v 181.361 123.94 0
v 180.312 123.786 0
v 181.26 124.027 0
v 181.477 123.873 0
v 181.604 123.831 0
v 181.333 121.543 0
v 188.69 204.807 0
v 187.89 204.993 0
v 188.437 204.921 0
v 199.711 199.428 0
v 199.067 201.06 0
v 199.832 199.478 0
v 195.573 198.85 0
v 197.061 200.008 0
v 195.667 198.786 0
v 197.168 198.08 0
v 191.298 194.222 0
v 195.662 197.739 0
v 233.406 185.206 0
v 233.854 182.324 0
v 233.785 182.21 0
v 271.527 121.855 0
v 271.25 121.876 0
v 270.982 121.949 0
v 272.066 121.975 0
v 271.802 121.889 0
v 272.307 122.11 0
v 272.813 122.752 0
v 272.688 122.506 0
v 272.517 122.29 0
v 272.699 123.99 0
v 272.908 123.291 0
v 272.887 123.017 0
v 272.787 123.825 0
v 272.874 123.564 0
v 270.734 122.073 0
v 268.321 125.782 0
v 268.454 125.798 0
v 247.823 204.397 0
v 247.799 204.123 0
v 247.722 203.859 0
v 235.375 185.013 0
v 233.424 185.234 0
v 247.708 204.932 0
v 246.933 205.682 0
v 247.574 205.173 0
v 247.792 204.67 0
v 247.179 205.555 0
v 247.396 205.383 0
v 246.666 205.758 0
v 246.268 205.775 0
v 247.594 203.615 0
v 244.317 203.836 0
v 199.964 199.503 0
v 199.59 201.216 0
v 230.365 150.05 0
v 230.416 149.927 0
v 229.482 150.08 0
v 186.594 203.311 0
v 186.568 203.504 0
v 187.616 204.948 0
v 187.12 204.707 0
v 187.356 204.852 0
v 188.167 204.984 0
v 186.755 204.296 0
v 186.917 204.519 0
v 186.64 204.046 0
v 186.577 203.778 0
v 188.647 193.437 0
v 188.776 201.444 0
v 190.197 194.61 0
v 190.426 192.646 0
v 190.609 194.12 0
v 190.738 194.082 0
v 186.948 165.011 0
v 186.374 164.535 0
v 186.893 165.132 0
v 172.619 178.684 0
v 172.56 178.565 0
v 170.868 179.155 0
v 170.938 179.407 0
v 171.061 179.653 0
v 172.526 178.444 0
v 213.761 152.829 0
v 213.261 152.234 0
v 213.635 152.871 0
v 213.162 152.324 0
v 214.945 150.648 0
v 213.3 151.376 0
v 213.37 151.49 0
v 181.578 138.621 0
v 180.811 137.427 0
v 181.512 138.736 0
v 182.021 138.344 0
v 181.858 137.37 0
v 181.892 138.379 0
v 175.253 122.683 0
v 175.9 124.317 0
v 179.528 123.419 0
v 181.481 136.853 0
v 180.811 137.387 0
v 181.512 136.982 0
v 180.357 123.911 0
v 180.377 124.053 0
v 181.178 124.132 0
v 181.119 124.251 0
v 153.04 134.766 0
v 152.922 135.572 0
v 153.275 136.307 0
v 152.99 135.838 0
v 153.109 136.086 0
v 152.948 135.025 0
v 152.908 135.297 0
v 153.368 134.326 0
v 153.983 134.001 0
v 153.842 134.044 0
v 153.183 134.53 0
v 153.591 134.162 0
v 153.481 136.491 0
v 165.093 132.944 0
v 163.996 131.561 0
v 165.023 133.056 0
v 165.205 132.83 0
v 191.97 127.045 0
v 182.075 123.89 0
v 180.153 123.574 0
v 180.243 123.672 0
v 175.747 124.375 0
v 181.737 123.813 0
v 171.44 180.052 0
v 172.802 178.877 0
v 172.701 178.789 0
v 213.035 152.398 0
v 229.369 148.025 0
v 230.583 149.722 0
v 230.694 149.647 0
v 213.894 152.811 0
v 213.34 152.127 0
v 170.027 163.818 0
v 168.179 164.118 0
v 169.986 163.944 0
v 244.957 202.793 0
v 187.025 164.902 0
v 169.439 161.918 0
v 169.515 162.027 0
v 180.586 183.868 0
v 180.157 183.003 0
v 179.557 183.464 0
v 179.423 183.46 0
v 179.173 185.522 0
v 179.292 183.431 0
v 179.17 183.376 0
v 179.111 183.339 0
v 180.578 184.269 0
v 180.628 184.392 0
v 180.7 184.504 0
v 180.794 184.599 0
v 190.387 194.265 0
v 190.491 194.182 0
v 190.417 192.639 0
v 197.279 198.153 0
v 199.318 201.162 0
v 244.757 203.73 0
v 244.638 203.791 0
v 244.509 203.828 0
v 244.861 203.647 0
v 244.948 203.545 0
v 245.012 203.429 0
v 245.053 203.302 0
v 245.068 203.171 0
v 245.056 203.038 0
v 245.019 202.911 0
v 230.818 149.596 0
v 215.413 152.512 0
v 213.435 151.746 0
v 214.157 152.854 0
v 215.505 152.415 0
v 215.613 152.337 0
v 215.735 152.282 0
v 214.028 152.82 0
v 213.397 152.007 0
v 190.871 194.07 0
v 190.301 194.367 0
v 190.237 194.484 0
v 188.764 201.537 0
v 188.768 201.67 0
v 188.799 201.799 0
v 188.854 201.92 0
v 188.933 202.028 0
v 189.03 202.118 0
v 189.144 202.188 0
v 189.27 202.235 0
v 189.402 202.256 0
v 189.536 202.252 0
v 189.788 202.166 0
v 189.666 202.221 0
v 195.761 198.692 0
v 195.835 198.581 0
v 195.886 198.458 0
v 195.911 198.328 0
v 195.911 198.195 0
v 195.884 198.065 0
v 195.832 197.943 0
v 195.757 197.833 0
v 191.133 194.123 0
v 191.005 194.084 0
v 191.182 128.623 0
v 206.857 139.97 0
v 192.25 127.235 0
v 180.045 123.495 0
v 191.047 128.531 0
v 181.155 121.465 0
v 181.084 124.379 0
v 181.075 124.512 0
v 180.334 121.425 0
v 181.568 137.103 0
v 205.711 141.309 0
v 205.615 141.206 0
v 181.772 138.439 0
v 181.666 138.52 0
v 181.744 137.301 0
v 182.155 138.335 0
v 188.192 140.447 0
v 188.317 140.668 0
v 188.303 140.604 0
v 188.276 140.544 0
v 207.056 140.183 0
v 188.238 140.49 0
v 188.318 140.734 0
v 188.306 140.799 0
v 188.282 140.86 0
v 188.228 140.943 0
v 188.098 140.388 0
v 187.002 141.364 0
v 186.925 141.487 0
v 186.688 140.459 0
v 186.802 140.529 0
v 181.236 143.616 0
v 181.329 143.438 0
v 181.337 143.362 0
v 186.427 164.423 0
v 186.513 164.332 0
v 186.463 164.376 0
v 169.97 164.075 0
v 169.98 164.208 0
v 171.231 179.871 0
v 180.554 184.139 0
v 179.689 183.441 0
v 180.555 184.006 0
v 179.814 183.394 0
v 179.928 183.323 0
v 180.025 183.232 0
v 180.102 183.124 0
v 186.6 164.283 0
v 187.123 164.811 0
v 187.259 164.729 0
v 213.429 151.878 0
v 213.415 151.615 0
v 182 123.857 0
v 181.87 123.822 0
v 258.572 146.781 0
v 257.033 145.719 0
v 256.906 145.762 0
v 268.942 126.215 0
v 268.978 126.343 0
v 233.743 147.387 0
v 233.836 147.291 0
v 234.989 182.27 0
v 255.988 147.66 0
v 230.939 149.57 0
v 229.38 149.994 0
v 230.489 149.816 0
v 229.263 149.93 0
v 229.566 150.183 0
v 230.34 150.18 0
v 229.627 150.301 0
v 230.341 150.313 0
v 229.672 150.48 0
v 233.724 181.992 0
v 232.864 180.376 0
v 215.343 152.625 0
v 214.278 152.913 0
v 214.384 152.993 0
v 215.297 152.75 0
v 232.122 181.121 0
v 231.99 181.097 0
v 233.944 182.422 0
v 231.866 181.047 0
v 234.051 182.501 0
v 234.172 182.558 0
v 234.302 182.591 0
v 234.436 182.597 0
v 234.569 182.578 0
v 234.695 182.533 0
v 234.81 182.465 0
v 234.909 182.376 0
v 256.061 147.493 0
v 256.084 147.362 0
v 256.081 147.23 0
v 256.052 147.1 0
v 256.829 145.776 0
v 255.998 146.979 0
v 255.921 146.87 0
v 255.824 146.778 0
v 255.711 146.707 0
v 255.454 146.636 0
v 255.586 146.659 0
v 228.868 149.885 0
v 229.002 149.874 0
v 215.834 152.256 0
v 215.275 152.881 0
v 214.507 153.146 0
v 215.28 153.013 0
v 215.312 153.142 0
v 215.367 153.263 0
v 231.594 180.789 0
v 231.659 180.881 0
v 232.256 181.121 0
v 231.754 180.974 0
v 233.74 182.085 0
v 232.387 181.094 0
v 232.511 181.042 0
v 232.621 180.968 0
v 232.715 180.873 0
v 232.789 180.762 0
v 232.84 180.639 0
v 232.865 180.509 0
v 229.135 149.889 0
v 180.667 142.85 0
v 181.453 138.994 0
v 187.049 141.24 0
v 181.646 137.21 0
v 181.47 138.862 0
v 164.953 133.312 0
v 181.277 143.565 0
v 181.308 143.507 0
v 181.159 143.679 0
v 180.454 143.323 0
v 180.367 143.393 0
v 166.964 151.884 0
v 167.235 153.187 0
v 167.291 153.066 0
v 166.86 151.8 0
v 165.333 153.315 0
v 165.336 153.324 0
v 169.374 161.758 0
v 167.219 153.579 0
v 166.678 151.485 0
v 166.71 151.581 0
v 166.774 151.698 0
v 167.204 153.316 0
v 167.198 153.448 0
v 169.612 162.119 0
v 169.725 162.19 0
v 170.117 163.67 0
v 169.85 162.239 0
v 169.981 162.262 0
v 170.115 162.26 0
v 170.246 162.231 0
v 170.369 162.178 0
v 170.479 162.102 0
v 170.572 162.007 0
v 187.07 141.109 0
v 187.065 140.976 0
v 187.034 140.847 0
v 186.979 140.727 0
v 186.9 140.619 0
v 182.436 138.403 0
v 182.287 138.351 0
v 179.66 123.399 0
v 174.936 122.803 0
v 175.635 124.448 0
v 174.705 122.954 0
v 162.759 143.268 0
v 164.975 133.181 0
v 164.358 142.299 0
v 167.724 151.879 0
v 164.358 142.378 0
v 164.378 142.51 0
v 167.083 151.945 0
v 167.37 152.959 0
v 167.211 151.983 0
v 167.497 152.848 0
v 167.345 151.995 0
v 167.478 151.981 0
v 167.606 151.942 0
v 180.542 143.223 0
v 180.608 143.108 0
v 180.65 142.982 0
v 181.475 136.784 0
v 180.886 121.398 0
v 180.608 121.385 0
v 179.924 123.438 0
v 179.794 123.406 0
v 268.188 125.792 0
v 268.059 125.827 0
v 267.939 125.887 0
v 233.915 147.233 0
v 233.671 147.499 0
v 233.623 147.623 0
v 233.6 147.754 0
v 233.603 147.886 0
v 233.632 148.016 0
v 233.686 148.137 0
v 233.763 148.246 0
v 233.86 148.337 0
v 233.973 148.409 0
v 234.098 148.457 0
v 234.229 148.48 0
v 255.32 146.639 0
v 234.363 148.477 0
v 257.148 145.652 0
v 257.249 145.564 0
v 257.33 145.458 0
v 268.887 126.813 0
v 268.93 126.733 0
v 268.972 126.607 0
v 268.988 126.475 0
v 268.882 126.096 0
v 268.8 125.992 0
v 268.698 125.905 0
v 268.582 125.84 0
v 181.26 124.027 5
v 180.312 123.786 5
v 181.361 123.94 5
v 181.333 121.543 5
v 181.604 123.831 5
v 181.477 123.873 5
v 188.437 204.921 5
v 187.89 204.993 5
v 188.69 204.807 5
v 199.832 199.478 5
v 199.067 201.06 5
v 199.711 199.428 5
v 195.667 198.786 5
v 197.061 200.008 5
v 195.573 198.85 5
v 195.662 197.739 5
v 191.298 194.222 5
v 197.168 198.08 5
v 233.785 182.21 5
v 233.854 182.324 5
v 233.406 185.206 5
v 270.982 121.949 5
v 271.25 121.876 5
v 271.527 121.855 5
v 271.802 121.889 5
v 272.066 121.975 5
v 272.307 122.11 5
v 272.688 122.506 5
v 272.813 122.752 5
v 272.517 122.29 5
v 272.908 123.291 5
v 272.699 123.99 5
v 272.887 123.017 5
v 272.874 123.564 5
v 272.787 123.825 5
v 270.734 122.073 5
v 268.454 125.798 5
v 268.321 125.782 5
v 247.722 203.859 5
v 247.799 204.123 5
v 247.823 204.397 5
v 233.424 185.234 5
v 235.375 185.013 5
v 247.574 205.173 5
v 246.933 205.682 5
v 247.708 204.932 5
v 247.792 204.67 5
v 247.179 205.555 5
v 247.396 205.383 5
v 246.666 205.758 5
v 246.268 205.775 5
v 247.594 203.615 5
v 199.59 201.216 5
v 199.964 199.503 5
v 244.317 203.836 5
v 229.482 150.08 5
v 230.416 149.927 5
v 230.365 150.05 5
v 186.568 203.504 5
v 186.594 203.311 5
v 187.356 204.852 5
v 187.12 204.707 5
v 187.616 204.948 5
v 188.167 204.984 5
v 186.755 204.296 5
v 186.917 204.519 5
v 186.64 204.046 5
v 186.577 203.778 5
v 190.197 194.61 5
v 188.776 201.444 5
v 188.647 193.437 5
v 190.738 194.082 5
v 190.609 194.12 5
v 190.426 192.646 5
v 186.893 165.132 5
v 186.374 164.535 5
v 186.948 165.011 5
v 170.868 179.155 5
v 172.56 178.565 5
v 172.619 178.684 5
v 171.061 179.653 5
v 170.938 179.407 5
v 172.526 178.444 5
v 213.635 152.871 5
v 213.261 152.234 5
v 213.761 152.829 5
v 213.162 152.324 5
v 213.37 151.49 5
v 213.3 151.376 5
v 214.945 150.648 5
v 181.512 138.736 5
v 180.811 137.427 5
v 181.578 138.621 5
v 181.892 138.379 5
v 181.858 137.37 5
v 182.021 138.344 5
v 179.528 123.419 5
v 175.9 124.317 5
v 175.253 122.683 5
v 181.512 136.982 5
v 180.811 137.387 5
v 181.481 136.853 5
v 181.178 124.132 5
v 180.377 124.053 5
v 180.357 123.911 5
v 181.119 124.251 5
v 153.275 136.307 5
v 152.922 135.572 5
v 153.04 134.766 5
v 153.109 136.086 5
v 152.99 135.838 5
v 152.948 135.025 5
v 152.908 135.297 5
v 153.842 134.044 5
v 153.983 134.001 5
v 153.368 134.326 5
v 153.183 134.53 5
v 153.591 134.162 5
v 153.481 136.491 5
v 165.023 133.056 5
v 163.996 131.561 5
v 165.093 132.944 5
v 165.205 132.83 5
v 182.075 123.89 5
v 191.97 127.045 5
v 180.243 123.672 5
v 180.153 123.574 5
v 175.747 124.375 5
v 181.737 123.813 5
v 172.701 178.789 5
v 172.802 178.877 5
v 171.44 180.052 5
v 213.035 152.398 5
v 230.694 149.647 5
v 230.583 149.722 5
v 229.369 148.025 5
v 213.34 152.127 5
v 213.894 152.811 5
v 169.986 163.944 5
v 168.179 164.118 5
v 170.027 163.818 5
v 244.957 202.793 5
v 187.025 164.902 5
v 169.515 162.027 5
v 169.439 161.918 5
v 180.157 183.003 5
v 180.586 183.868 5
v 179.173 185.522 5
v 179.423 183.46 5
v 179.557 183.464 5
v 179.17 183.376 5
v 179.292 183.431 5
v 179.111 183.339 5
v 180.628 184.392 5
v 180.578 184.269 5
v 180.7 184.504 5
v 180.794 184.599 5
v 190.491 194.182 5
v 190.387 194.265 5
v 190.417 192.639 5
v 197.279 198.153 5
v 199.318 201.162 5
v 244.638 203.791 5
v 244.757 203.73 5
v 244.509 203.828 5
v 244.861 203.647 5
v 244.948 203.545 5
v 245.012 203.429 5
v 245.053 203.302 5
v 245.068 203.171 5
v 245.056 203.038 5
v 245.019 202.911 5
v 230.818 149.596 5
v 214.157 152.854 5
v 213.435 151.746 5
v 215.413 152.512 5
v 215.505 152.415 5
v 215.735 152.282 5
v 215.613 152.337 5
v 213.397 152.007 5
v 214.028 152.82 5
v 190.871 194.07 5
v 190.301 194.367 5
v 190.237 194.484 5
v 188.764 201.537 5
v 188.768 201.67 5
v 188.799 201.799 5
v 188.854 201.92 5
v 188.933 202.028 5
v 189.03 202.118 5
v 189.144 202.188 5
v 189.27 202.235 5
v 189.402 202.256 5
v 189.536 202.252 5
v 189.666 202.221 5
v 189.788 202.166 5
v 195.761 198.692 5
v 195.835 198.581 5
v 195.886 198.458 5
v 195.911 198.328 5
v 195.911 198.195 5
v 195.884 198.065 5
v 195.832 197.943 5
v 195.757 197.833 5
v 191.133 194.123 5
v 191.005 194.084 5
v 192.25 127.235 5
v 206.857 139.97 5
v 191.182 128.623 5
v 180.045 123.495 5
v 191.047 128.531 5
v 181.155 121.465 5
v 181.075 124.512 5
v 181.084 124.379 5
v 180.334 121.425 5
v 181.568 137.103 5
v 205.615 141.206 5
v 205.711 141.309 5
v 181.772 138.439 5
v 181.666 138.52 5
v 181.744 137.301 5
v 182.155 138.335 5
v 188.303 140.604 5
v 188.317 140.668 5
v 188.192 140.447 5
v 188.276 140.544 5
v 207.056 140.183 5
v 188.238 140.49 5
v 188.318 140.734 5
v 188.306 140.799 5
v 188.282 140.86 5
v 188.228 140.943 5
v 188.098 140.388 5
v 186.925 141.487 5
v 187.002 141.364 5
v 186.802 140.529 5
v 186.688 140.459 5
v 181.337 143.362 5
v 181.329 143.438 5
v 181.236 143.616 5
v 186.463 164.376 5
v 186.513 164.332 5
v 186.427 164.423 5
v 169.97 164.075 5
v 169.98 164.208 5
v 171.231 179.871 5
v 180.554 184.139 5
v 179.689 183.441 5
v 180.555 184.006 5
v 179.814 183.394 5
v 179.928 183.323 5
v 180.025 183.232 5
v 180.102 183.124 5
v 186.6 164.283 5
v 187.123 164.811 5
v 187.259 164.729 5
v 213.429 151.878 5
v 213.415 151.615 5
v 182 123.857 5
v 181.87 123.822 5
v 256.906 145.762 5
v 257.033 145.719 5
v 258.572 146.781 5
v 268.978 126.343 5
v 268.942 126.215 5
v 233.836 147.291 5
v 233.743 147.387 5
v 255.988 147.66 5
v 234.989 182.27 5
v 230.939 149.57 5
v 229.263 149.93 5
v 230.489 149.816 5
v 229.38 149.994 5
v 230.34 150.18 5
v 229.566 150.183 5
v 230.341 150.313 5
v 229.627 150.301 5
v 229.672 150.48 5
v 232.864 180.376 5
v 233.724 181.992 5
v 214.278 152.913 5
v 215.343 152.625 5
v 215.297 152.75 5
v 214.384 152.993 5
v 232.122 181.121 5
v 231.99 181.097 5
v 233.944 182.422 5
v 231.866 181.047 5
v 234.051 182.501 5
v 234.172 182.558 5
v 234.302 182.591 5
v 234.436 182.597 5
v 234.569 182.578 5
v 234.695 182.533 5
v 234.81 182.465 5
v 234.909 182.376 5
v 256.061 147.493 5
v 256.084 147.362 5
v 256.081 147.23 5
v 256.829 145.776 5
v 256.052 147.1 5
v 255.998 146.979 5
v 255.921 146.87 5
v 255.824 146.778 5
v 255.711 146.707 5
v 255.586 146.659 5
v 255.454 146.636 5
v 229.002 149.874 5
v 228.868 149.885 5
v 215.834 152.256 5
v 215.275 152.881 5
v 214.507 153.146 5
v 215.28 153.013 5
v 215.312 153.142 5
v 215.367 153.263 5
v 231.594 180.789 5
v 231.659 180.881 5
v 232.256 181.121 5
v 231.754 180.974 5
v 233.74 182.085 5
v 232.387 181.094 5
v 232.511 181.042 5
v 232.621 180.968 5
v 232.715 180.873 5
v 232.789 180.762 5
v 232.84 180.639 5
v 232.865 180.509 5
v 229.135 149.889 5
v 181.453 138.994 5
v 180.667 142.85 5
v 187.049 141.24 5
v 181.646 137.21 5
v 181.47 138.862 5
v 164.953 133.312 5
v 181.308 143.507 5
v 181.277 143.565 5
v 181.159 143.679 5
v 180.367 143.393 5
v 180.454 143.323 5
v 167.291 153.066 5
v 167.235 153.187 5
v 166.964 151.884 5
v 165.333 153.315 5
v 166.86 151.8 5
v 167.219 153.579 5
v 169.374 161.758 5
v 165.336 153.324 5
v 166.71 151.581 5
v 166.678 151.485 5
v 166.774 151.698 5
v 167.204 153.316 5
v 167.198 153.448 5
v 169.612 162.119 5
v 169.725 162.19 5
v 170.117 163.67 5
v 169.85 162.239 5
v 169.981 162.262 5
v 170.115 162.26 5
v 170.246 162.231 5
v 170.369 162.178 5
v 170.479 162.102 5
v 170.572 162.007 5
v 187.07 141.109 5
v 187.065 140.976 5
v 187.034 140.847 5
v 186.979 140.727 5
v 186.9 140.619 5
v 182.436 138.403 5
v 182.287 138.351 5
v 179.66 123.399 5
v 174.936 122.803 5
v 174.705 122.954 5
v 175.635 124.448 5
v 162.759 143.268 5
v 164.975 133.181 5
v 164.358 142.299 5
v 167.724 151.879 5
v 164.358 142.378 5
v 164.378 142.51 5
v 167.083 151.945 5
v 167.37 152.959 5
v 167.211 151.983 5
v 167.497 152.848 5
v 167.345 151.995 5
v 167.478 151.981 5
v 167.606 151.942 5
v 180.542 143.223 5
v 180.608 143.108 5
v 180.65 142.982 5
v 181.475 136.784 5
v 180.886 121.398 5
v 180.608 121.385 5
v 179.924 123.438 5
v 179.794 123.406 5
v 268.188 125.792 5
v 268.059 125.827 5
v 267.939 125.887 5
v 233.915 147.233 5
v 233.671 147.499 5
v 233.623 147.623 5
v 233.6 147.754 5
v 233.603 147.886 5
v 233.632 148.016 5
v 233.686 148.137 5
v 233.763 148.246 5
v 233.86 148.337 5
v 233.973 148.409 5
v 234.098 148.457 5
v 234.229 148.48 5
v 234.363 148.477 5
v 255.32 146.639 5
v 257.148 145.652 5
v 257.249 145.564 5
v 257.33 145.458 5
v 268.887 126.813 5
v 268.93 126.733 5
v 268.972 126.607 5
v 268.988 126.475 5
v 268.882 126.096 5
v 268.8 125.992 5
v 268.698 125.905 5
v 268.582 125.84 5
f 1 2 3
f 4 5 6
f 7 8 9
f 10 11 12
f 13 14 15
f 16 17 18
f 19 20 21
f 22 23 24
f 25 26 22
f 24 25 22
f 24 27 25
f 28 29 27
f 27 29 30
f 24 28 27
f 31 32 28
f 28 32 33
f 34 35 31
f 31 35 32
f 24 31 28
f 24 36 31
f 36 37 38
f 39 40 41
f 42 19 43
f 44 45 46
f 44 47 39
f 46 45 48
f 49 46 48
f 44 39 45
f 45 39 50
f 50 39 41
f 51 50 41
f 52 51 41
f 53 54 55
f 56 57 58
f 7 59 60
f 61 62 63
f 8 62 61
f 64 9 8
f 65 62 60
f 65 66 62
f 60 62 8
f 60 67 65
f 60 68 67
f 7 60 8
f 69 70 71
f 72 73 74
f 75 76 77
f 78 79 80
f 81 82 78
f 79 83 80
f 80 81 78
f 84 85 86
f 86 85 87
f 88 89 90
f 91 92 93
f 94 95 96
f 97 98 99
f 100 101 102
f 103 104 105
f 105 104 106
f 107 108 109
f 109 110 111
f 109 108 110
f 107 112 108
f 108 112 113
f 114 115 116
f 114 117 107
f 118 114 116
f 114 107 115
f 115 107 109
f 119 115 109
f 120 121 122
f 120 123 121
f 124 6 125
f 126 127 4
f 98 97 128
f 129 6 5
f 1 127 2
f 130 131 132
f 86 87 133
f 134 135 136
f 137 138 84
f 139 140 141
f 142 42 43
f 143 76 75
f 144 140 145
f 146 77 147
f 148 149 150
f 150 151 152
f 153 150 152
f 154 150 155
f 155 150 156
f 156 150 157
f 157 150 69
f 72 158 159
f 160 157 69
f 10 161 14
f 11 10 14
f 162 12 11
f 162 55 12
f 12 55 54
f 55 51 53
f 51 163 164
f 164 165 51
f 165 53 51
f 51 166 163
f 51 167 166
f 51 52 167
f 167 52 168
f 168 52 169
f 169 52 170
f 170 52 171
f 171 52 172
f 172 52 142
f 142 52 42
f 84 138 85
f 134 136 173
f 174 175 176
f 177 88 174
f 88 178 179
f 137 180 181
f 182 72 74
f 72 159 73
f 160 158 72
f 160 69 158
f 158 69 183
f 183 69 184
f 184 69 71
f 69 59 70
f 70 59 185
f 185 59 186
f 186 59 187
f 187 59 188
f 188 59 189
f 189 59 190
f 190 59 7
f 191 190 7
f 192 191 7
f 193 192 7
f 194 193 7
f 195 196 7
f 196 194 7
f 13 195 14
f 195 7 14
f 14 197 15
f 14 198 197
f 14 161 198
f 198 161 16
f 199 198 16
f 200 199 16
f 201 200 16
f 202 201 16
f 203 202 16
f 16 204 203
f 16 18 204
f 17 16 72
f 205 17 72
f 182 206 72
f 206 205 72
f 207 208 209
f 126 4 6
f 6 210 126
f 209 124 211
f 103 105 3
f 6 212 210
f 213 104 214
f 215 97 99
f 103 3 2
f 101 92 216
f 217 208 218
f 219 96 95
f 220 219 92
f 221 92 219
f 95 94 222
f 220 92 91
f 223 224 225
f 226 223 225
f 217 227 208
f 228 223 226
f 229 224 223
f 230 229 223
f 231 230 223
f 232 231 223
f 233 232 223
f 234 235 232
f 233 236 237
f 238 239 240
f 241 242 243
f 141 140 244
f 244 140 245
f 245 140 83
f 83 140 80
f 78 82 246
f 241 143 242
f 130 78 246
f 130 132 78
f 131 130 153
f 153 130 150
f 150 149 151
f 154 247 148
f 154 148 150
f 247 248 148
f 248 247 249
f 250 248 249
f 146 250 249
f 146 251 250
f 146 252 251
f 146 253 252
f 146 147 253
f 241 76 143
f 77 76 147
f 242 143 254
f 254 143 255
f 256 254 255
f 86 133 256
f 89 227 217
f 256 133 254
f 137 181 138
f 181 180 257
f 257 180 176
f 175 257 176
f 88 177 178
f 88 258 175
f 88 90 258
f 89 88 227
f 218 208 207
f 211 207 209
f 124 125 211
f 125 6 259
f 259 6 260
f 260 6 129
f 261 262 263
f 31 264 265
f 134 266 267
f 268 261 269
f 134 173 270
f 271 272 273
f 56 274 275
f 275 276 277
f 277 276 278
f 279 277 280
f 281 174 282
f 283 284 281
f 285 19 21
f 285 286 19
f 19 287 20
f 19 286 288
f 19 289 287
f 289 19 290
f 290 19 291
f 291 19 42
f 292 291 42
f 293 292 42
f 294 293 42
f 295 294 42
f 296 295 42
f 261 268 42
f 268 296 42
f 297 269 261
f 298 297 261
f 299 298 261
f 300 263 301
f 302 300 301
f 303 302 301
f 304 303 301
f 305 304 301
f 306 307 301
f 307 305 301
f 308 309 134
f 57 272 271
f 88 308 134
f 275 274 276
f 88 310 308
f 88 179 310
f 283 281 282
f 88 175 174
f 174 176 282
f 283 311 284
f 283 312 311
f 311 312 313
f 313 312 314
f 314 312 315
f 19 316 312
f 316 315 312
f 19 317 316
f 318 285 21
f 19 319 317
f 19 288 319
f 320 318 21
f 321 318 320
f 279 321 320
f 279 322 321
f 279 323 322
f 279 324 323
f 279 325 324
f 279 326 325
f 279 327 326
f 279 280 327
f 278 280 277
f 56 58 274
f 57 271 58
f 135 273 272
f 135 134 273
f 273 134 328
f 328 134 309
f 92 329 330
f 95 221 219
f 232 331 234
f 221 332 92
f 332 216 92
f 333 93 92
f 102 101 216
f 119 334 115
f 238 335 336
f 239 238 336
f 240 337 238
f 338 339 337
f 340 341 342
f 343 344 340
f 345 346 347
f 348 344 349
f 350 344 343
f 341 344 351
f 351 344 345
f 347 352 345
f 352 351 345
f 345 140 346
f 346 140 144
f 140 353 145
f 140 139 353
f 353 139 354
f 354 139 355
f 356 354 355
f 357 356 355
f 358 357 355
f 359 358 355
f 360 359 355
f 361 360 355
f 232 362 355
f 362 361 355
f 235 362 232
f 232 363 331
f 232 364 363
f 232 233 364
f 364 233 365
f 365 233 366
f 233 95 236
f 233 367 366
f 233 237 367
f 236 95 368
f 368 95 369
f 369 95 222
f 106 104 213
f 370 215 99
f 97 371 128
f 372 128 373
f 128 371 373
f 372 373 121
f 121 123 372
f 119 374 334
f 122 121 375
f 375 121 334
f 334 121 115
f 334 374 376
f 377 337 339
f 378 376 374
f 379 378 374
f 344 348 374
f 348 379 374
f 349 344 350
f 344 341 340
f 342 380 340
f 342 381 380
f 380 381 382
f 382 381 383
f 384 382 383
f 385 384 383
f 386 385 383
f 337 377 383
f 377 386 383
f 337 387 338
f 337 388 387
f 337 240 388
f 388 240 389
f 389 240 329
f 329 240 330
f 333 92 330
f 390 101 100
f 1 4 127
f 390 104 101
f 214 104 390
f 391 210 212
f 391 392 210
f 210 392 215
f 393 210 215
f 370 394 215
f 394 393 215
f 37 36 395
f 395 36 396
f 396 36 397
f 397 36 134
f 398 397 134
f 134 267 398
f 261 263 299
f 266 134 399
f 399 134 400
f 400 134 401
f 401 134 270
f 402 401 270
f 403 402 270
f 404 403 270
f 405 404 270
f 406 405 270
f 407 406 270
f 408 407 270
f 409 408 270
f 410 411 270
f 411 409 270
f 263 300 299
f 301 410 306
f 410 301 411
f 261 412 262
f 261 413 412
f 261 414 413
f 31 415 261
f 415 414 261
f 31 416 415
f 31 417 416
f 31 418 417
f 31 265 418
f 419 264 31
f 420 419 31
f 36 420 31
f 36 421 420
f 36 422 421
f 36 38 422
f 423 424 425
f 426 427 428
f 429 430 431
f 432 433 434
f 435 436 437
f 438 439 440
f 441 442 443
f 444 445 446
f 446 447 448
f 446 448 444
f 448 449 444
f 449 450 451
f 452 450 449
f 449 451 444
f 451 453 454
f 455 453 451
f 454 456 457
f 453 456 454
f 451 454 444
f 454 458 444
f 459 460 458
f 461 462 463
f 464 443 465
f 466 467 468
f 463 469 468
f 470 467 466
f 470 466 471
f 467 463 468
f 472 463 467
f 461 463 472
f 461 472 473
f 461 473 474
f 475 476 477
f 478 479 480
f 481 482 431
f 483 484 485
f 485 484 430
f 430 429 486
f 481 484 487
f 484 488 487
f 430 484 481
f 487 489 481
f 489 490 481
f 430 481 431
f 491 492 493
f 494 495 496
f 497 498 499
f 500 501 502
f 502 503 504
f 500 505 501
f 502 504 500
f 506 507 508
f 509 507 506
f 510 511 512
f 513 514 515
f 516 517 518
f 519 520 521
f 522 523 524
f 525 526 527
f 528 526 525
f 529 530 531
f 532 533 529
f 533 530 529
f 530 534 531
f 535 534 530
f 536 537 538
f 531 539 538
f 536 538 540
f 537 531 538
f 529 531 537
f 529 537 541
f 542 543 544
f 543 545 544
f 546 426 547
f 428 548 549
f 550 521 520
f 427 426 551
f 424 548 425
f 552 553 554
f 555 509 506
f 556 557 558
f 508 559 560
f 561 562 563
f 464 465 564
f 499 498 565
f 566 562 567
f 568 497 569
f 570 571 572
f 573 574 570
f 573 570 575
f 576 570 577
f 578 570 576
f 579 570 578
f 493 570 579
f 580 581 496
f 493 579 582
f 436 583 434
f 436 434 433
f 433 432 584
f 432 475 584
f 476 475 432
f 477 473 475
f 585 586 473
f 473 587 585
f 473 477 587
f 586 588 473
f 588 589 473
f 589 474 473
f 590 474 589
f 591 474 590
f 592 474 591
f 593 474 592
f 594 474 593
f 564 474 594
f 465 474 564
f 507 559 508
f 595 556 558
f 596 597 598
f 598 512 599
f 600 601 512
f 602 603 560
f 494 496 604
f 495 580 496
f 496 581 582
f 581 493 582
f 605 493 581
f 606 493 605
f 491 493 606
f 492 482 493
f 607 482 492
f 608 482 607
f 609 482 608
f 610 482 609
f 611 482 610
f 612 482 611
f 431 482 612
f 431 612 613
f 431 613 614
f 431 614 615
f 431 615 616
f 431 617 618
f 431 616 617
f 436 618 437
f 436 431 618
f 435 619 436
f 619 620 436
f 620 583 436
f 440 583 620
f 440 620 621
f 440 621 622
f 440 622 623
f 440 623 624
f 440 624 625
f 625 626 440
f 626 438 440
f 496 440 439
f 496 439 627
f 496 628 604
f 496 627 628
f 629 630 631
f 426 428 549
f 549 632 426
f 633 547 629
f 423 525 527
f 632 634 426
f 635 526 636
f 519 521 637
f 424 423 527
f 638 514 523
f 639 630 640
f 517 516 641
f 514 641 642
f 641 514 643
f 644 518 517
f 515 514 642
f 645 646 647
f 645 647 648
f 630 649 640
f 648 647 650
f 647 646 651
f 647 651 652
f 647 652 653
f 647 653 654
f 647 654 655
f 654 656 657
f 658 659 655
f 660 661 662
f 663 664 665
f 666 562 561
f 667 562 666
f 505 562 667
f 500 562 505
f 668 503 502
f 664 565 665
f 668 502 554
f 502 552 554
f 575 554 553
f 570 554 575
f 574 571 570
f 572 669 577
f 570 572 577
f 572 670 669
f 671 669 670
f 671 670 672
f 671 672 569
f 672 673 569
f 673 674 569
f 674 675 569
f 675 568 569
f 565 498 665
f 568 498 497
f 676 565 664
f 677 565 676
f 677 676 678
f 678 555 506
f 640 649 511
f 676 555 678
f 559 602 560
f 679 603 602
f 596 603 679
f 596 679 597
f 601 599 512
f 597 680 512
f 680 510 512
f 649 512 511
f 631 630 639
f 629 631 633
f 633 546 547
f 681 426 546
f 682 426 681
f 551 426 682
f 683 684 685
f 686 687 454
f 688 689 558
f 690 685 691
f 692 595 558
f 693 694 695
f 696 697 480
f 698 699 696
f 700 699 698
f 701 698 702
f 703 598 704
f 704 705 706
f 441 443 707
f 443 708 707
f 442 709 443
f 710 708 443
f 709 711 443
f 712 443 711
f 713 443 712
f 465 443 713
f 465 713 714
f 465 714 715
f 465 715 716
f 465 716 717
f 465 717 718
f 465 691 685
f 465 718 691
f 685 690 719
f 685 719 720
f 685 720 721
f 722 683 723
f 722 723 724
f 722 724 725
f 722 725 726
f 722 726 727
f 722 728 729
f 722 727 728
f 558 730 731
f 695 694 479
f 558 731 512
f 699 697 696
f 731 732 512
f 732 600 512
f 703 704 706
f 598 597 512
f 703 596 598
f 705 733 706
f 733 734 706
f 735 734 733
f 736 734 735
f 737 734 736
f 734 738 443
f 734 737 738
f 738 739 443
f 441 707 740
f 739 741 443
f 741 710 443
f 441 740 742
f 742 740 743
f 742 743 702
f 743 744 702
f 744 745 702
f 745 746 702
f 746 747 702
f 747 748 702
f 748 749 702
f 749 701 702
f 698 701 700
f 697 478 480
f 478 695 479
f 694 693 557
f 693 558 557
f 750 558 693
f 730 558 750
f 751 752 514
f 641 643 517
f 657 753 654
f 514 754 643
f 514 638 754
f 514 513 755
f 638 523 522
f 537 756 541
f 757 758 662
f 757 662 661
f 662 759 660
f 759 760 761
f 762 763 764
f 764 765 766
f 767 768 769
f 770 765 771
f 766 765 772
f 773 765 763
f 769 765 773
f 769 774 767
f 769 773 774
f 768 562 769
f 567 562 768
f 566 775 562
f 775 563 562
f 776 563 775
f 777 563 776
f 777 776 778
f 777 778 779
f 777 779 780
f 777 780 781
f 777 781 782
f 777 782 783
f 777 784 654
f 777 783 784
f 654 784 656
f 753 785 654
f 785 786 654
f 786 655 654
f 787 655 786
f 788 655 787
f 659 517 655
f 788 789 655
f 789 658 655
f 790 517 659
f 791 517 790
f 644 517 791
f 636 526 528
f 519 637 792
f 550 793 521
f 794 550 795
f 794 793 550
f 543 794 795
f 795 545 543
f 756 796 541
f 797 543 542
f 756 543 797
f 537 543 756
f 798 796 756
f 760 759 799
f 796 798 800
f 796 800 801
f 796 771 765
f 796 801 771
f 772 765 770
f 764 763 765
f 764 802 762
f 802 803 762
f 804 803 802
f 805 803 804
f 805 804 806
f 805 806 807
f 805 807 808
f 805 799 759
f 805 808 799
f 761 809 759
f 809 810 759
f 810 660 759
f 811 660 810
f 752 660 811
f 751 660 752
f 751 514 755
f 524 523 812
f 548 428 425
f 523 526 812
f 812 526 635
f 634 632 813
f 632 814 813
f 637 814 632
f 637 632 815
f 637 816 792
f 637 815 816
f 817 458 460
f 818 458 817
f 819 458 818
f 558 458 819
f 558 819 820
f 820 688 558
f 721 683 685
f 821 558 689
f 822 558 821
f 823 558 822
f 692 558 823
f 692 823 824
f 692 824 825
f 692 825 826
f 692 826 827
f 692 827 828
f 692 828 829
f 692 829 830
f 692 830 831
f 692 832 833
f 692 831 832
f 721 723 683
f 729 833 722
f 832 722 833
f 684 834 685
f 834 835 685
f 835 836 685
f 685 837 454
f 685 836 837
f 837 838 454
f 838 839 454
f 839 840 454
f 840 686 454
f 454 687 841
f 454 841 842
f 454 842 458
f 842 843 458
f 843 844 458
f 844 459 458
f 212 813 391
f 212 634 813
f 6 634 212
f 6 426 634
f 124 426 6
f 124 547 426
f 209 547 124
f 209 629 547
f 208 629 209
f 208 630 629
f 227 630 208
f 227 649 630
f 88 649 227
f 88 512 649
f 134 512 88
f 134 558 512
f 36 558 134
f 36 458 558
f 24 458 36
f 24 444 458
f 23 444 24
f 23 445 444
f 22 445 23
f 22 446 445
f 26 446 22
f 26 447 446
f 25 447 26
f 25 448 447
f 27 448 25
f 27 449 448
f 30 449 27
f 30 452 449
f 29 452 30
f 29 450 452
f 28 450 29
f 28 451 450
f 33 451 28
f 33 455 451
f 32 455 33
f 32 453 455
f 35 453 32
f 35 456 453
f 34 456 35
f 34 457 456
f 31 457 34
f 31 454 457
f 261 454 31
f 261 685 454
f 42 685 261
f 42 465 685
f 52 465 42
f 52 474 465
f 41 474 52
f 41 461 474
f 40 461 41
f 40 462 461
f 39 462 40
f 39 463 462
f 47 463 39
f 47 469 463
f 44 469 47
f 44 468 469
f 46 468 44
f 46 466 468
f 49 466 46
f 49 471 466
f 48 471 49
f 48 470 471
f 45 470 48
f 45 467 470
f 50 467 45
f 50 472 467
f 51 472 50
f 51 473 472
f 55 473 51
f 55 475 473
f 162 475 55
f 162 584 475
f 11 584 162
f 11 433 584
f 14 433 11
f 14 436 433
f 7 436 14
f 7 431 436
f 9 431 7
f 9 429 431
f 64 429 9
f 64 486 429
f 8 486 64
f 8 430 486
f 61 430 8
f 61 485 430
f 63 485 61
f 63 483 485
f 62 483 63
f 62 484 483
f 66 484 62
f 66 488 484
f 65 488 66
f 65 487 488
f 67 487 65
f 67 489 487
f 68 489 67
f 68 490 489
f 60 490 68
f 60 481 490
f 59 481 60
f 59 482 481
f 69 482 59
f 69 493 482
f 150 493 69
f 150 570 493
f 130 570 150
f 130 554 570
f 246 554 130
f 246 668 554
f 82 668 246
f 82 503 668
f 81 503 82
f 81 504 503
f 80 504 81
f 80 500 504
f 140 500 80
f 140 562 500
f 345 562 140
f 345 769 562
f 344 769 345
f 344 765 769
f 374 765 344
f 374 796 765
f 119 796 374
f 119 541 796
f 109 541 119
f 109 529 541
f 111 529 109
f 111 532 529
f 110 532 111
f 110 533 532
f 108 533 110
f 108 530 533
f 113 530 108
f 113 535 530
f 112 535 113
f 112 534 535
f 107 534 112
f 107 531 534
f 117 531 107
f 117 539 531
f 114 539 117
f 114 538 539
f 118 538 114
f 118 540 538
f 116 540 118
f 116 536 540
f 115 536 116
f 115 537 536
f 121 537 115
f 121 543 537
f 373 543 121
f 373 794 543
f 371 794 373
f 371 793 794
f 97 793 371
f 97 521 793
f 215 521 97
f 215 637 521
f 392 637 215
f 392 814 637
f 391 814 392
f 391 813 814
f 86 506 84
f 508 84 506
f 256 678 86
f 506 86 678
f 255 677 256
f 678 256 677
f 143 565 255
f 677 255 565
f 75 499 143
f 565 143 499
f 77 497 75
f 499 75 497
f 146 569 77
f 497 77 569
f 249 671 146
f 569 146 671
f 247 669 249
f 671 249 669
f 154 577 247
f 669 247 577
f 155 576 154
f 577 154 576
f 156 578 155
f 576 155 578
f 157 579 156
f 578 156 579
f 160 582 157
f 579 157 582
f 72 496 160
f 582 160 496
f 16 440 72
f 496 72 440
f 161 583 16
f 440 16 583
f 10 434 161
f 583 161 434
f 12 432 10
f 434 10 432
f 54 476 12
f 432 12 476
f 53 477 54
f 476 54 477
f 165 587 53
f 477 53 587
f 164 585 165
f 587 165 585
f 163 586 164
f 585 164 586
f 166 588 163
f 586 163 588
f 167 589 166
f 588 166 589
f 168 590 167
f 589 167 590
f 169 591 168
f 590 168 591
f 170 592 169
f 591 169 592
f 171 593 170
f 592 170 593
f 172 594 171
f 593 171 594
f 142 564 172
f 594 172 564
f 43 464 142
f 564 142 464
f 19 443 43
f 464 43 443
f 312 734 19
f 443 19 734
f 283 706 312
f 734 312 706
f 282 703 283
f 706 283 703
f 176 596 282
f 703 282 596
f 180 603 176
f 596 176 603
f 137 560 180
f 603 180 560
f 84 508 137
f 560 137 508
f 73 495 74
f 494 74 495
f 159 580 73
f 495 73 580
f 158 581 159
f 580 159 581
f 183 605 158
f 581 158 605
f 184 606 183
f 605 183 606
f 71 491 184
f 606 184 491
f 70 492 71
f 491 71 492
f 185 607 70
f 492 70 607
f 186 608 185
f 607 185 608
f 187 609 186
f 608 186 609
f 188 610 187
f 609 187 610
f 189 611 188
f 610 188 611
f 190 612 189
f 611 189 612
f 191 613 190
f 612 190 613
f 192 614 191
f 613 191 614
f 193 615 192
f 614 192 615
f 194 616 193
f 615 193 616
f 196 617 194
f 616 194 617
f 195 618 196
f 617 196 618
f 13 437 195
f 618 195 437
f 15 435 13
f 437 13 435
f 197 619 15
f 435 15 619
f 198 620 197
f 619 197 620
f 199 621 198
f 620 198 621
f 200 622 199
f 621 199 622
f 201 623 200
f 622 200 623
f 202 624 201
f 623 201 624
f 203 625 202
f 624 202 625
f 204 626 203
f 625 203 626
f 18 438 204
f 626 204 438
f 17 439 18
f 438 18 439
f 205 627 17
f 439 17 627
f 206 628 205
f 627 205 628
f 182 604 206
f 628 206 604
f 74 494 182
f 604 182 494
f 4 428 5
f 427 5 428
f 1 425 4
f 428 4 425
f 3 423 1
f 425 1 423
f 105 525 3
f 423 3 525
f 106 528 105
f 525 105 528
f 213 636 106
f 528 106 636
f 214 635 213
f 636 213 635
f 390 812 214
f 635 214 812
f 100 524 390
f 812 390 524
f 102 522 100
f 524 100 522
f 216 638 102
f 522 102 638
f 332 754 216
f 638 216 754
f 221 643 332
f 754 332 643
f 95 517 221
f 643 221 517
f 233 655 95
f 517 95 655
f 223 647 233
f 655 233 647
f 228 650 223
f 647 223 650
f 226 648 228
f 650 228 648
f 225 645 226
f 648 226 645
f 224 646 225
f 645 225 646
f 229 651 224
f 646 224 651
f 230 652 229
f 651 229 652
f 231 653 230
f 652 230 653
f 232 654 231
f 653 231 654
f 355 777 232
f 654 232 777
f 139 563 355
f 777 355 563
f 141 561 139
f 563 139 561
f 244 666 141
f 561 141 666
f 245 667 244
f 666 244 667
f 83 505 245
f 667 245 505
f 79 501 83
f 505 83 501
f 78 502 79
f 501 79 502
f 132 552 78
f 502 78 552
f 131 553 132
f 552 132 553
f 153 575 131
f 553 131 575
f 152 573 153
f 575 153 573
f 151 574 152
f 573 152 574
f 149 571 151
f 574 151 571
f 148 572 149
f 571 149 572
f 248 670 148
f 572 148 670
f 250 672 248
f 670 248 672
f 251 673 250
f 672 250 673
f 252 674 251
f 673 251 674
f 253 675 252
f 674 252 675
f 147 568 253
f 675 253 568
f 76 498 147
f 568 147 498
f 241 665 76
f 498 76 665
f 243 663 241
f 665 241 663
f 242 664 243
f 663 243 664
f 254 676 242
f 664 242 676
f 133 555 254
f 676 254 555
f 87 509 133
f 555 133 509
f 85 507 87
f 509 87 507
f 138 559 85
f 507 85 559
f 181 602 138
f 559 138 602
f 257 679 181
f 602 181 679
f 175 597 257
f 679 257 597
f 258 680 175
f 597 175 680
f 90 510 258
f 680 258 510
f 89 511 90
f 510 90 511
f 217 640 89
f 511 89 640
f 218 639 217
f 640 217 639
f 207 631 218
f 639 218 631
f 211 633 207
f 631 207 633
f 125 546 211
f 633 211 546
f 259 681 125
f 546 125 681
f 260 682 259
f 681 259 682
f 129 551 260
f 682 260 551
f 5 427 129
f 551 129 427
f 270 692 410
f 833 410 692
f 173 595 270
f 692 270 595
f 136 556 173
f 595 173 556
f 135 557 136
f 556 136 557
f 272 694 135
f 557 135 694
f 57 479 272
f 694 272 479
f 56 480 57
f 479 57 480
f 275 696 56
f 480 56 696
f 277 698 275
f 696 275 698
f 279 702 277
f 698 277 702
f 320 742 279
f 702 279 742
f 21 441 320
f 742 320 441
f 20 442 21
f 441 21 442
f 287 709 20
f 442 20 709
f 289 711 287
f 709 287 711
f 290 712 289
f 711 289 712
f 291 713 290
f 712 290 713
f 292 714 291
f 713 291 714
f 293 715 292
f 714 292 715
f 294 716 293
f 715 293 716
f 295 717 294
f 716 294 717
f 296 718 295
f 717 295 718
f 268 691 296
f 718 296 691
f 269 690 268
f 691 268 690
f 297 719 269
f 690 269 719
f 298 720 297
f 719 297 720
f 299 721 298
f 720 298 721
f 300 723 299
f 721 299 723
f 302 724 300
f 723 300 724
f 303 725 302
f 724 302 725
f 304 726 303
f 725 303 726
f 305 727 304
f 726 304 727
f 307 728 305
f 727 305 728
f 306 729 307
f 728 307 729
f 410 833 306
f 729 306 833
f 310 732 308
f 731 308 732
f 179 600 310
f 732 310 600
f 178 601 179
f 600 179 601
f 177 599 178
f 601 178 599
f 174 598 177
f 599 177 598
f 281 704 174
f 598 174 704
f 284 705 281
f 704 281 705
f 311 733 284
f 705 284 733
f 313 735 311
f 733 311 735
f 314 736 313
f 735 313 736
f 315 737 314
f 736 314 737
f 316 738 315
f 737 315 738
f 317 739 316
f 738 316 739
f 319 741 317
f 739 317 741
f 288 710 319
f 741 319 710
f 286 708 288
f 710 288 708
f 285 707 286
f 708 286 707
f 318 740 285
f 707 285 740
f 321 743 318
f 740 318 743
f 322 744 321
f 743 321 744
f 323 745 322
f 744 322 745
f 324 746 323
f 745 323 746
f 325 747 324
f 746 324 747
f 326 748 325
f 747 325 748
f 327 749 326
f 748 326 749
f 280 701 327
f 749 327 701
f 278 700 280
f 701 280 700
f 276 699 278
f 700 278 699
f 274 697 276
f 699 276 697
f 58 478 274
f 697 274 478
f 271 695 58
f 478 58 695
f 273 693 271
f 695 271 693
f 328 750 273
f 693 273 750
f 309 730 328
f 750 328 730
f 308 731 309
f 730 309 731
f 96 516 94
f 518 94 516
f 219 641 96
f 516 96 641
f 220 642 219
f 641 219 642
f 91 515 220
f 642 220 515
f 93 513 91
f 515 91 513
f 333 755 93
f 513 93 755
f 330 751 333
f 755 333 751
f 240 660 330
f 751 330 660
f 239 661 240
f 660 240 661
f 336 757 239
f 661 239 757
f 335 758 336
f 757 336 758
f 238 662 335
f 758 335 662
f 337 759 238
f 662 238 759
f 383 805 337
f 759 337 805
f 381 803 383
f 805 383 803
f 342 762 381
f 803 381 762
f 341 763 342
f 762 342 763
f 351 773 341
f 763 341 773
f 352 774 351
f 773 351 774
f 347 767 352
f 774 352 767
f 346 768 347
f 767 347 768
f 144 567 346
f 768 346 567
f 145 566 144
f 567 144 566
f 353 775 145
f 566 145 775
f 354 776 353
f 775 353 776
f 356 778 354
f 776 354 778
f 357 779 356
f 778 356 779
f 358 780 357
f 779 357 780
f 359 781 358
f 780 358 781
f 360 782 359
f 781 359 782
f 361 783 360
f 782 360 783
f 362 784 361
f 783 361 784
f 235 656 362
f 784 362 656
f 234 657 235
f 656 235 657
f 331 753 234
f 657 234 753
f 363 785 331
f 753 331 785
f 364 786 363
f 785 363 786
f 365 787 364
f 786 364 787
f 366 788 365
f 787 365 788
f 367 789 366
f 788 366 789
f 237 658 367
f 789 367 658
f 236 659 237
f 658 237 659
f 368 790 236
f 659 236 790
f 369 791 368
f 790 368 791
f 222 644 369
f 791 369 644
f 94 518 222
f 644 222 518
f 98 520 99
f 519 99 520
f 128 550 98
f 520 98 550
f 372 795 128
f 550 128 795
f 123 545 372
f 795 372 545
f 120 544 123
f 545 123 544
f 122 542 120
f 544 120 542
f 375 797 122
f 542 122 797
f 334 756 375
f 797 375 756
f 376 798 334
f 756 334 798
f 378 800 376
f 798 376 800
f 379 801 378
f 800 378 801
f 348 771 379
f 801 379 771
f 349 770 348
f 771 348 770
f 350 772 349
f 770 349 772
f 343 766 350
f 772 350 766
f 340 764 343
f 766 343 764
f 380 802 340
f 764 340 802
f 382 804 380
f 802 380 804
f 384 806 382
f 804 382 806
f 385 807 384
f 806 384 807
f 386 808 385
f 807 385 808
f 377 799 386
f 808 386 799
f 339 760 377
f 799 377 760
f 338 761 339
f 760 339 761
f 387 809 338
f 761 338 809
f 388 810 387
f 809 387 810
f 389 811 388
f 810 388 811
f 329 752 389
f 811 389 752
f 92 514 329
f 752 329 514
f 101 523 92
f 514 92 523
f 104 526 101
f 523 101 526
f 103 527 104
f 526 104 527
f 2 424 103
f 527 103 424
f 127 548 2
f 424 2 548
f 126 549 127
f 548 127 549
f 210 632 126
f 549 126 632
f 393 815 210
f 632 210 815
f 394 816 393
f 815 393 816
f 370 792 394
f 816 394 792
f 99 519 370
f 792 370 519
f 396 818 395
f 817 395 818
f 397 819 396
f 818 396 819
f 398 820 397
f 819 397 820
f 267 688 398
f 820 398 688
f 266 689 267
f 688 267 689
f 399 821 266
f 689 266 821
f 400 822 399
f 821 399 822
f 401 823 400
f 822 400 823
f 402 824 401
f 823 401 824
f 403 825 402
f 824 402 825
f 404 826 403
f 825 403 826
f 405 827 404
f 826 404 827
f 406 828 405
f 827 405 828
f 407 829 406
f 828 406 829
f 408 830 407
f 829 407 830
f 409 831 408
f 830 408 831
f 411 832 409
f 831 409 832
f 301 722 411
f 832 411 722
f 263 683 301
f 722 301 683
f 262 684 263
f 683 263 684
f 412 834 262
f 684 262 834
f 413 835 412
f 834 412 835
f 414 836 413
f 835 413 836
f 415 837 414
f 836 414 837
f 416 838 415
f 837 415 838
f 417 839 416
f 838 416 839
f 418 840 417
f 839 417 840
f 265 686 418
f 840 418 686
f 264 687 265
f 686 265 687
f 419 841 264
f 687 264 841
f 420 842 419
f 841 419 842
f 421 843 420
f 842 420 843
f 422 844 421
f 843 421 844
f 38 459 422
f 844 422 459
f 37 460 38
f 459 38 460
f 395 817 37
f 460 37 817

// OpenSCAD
/*
 * Customizable Origami - Bird - https://www.thingiverse.com/thing:2712239
 * by Dennis Hofmann - https://www.thingiverse.com/mightynozzle/about
 * created 2017-12-13
 * version v1.0
 *
 * Changelog
 * --------------
 * v1.0:
 *      - final design
 * --------------
 * 
 * This work is licensed under the Creative Commons - Attribution - NonCommercial - ShareAlike license.
 * https://creativecommons.org/licenses/by-nc-sa/3.0/
 */


 // Parameter Section //
//-------------------//

// preview[view:north, tilt:top]

// The maximum size of the longest side. The shorter side will be automatically resized in same ratio.
max_size_in_millimeter = 120; //[20:300]

// The height of the model.
model_height_in_millimeter = 5; //[0.2:0.2:100]

// Thickness of the outer outline.
outline_size_in_millimeter = 1.8; //[0.5:0.1:20]

// Thickness of the inner outline.
inline_size_in_millimeter = 0.7; //[0.5:0.1:20]

// Roundiness of the ends of the inner outlines.
inline_edge_radius_in_millimeter = 0.7; //[0.0:0.1:5]

// Flip model
flip_model = "no"; //[yes,no]

/*[hidden]*/
max_size = max_size_in_millimeter;
model_height = model_height_in_millimeter;
$fn=32;

// Outer Points
A1 = [972, 861];
A2 = [1037, 845];
A3 = [1106, 789];
A4 = [1138, 781];
A5 = [1205, 816];
A6 = [1297, 897];
A7 = [1350, 968];
A8 = [1448, 950];
A9 = [1710, 784];
A10 = [1621, 929];
A11 = [1472, 1177];
A12 = [1552, 1300];
A13 = [1258, 1271];
A14 = [1241, 1262];
A15 = [1184, 1295];
A16 = [1198, 1227];
A17 = [1134, 1173];
A18 = [1085, 1138];
A19 = [1068, 1042];
A20 = [1050, 973];
A21 = [1033, 906];

outline = [A1, A2, A3, A4, A5, A6, A7, A8, A9, A10, A11, A12, A13, A14, A15, A16, A17, A18, A19, A20, A21];

// Inner Points
B1 = [1140, 912];
B2 = [1141, 874];
B3 = [1184, 895];
B4 = [1176, 1047];

// Polygons
C1 = [A1, A2, A21];
C2 = [A2, A3, A4, B2, B1, A20, A21];
C3 = [A4, A5, A6, A7, B4, A17, A18, A19, B3, B2];
C4 = [B2, B3, A19, A20, B1];
C5 = [A16, A15, A14];
C6 = [A17, B4, A7, A11, A12, A13, A14, A16];
C7 = [A7, A8, A11];
C8 = [A8, A10, A11];
C9 = [A10, A9, A8];

cut_polygons = [/*C1,*/ C2, C3, C4, C5, C6, C7, C8, C9];

min_x = A1[0];
min_y = A4[1];
max_x = A9[0];
max_y = A12[1];

x_size = max_x - min_x;
y_size = max_y - min_y;

x_factor = max_size / x_size;
y_factor = max_size / y_size;

inline_size = x_size > y_size ? inline_size_in_millimeter / x_factor / 2: inline_size_in_millimeter / y_factor / 2;
inline_edge_radius = x_size > y_size ? inline_edge_radius_in_millimeter / x_factor: inline_edge_radius_in_millimeter / y_factor;
outline_size = x_size > y_size ? outline_size_in_millimeter / x_factor - inline_size: outline_size_in_millimeter / y_factor - inline_size;


 // Program Section //
//-----------------//

if(x_size > y_size) {
    resize(newsize=[max_size, x_factor * y_size, model_height]){
        if(flip_model == "yes") {
            mirror([0,1,0]) {
                rotate([180,180,0]) {    
                    create(outline, cut_polygons);
                }
            }
        } else {
            create(outline, cut_polygons);
        }
    }
} else {
    resize(newsize=[y_factor * x_size, max_size, model_height]){
        if(flip_model == "yes") {
            mirror([0,1,0]) {
                rotate([180,180,0]) {    
                    create(outline, cut_polygons);
                }
            }
        } else {
            create(outline, cut_polygons);
        }
    }
}


 // Module Section //
//----------------//

module create() {
    linear_extrude(height=1) {
        difference() {
            offset(r = -0) {
                offset(r = +outline_size) {
                    polygon(points = outline, convexity = 10);
                }
            }
            
            for(cut_polygon = [0:len(cut_polygons)]) {
                offset(r = +inline_edge_radius) {
                    offset(r = -inline_size - inline_edge_radius) {
                        polygon(points = cut_polygons[cut_polygon], convexity = 10);
                    }
                }
            }
        }
    }
}
